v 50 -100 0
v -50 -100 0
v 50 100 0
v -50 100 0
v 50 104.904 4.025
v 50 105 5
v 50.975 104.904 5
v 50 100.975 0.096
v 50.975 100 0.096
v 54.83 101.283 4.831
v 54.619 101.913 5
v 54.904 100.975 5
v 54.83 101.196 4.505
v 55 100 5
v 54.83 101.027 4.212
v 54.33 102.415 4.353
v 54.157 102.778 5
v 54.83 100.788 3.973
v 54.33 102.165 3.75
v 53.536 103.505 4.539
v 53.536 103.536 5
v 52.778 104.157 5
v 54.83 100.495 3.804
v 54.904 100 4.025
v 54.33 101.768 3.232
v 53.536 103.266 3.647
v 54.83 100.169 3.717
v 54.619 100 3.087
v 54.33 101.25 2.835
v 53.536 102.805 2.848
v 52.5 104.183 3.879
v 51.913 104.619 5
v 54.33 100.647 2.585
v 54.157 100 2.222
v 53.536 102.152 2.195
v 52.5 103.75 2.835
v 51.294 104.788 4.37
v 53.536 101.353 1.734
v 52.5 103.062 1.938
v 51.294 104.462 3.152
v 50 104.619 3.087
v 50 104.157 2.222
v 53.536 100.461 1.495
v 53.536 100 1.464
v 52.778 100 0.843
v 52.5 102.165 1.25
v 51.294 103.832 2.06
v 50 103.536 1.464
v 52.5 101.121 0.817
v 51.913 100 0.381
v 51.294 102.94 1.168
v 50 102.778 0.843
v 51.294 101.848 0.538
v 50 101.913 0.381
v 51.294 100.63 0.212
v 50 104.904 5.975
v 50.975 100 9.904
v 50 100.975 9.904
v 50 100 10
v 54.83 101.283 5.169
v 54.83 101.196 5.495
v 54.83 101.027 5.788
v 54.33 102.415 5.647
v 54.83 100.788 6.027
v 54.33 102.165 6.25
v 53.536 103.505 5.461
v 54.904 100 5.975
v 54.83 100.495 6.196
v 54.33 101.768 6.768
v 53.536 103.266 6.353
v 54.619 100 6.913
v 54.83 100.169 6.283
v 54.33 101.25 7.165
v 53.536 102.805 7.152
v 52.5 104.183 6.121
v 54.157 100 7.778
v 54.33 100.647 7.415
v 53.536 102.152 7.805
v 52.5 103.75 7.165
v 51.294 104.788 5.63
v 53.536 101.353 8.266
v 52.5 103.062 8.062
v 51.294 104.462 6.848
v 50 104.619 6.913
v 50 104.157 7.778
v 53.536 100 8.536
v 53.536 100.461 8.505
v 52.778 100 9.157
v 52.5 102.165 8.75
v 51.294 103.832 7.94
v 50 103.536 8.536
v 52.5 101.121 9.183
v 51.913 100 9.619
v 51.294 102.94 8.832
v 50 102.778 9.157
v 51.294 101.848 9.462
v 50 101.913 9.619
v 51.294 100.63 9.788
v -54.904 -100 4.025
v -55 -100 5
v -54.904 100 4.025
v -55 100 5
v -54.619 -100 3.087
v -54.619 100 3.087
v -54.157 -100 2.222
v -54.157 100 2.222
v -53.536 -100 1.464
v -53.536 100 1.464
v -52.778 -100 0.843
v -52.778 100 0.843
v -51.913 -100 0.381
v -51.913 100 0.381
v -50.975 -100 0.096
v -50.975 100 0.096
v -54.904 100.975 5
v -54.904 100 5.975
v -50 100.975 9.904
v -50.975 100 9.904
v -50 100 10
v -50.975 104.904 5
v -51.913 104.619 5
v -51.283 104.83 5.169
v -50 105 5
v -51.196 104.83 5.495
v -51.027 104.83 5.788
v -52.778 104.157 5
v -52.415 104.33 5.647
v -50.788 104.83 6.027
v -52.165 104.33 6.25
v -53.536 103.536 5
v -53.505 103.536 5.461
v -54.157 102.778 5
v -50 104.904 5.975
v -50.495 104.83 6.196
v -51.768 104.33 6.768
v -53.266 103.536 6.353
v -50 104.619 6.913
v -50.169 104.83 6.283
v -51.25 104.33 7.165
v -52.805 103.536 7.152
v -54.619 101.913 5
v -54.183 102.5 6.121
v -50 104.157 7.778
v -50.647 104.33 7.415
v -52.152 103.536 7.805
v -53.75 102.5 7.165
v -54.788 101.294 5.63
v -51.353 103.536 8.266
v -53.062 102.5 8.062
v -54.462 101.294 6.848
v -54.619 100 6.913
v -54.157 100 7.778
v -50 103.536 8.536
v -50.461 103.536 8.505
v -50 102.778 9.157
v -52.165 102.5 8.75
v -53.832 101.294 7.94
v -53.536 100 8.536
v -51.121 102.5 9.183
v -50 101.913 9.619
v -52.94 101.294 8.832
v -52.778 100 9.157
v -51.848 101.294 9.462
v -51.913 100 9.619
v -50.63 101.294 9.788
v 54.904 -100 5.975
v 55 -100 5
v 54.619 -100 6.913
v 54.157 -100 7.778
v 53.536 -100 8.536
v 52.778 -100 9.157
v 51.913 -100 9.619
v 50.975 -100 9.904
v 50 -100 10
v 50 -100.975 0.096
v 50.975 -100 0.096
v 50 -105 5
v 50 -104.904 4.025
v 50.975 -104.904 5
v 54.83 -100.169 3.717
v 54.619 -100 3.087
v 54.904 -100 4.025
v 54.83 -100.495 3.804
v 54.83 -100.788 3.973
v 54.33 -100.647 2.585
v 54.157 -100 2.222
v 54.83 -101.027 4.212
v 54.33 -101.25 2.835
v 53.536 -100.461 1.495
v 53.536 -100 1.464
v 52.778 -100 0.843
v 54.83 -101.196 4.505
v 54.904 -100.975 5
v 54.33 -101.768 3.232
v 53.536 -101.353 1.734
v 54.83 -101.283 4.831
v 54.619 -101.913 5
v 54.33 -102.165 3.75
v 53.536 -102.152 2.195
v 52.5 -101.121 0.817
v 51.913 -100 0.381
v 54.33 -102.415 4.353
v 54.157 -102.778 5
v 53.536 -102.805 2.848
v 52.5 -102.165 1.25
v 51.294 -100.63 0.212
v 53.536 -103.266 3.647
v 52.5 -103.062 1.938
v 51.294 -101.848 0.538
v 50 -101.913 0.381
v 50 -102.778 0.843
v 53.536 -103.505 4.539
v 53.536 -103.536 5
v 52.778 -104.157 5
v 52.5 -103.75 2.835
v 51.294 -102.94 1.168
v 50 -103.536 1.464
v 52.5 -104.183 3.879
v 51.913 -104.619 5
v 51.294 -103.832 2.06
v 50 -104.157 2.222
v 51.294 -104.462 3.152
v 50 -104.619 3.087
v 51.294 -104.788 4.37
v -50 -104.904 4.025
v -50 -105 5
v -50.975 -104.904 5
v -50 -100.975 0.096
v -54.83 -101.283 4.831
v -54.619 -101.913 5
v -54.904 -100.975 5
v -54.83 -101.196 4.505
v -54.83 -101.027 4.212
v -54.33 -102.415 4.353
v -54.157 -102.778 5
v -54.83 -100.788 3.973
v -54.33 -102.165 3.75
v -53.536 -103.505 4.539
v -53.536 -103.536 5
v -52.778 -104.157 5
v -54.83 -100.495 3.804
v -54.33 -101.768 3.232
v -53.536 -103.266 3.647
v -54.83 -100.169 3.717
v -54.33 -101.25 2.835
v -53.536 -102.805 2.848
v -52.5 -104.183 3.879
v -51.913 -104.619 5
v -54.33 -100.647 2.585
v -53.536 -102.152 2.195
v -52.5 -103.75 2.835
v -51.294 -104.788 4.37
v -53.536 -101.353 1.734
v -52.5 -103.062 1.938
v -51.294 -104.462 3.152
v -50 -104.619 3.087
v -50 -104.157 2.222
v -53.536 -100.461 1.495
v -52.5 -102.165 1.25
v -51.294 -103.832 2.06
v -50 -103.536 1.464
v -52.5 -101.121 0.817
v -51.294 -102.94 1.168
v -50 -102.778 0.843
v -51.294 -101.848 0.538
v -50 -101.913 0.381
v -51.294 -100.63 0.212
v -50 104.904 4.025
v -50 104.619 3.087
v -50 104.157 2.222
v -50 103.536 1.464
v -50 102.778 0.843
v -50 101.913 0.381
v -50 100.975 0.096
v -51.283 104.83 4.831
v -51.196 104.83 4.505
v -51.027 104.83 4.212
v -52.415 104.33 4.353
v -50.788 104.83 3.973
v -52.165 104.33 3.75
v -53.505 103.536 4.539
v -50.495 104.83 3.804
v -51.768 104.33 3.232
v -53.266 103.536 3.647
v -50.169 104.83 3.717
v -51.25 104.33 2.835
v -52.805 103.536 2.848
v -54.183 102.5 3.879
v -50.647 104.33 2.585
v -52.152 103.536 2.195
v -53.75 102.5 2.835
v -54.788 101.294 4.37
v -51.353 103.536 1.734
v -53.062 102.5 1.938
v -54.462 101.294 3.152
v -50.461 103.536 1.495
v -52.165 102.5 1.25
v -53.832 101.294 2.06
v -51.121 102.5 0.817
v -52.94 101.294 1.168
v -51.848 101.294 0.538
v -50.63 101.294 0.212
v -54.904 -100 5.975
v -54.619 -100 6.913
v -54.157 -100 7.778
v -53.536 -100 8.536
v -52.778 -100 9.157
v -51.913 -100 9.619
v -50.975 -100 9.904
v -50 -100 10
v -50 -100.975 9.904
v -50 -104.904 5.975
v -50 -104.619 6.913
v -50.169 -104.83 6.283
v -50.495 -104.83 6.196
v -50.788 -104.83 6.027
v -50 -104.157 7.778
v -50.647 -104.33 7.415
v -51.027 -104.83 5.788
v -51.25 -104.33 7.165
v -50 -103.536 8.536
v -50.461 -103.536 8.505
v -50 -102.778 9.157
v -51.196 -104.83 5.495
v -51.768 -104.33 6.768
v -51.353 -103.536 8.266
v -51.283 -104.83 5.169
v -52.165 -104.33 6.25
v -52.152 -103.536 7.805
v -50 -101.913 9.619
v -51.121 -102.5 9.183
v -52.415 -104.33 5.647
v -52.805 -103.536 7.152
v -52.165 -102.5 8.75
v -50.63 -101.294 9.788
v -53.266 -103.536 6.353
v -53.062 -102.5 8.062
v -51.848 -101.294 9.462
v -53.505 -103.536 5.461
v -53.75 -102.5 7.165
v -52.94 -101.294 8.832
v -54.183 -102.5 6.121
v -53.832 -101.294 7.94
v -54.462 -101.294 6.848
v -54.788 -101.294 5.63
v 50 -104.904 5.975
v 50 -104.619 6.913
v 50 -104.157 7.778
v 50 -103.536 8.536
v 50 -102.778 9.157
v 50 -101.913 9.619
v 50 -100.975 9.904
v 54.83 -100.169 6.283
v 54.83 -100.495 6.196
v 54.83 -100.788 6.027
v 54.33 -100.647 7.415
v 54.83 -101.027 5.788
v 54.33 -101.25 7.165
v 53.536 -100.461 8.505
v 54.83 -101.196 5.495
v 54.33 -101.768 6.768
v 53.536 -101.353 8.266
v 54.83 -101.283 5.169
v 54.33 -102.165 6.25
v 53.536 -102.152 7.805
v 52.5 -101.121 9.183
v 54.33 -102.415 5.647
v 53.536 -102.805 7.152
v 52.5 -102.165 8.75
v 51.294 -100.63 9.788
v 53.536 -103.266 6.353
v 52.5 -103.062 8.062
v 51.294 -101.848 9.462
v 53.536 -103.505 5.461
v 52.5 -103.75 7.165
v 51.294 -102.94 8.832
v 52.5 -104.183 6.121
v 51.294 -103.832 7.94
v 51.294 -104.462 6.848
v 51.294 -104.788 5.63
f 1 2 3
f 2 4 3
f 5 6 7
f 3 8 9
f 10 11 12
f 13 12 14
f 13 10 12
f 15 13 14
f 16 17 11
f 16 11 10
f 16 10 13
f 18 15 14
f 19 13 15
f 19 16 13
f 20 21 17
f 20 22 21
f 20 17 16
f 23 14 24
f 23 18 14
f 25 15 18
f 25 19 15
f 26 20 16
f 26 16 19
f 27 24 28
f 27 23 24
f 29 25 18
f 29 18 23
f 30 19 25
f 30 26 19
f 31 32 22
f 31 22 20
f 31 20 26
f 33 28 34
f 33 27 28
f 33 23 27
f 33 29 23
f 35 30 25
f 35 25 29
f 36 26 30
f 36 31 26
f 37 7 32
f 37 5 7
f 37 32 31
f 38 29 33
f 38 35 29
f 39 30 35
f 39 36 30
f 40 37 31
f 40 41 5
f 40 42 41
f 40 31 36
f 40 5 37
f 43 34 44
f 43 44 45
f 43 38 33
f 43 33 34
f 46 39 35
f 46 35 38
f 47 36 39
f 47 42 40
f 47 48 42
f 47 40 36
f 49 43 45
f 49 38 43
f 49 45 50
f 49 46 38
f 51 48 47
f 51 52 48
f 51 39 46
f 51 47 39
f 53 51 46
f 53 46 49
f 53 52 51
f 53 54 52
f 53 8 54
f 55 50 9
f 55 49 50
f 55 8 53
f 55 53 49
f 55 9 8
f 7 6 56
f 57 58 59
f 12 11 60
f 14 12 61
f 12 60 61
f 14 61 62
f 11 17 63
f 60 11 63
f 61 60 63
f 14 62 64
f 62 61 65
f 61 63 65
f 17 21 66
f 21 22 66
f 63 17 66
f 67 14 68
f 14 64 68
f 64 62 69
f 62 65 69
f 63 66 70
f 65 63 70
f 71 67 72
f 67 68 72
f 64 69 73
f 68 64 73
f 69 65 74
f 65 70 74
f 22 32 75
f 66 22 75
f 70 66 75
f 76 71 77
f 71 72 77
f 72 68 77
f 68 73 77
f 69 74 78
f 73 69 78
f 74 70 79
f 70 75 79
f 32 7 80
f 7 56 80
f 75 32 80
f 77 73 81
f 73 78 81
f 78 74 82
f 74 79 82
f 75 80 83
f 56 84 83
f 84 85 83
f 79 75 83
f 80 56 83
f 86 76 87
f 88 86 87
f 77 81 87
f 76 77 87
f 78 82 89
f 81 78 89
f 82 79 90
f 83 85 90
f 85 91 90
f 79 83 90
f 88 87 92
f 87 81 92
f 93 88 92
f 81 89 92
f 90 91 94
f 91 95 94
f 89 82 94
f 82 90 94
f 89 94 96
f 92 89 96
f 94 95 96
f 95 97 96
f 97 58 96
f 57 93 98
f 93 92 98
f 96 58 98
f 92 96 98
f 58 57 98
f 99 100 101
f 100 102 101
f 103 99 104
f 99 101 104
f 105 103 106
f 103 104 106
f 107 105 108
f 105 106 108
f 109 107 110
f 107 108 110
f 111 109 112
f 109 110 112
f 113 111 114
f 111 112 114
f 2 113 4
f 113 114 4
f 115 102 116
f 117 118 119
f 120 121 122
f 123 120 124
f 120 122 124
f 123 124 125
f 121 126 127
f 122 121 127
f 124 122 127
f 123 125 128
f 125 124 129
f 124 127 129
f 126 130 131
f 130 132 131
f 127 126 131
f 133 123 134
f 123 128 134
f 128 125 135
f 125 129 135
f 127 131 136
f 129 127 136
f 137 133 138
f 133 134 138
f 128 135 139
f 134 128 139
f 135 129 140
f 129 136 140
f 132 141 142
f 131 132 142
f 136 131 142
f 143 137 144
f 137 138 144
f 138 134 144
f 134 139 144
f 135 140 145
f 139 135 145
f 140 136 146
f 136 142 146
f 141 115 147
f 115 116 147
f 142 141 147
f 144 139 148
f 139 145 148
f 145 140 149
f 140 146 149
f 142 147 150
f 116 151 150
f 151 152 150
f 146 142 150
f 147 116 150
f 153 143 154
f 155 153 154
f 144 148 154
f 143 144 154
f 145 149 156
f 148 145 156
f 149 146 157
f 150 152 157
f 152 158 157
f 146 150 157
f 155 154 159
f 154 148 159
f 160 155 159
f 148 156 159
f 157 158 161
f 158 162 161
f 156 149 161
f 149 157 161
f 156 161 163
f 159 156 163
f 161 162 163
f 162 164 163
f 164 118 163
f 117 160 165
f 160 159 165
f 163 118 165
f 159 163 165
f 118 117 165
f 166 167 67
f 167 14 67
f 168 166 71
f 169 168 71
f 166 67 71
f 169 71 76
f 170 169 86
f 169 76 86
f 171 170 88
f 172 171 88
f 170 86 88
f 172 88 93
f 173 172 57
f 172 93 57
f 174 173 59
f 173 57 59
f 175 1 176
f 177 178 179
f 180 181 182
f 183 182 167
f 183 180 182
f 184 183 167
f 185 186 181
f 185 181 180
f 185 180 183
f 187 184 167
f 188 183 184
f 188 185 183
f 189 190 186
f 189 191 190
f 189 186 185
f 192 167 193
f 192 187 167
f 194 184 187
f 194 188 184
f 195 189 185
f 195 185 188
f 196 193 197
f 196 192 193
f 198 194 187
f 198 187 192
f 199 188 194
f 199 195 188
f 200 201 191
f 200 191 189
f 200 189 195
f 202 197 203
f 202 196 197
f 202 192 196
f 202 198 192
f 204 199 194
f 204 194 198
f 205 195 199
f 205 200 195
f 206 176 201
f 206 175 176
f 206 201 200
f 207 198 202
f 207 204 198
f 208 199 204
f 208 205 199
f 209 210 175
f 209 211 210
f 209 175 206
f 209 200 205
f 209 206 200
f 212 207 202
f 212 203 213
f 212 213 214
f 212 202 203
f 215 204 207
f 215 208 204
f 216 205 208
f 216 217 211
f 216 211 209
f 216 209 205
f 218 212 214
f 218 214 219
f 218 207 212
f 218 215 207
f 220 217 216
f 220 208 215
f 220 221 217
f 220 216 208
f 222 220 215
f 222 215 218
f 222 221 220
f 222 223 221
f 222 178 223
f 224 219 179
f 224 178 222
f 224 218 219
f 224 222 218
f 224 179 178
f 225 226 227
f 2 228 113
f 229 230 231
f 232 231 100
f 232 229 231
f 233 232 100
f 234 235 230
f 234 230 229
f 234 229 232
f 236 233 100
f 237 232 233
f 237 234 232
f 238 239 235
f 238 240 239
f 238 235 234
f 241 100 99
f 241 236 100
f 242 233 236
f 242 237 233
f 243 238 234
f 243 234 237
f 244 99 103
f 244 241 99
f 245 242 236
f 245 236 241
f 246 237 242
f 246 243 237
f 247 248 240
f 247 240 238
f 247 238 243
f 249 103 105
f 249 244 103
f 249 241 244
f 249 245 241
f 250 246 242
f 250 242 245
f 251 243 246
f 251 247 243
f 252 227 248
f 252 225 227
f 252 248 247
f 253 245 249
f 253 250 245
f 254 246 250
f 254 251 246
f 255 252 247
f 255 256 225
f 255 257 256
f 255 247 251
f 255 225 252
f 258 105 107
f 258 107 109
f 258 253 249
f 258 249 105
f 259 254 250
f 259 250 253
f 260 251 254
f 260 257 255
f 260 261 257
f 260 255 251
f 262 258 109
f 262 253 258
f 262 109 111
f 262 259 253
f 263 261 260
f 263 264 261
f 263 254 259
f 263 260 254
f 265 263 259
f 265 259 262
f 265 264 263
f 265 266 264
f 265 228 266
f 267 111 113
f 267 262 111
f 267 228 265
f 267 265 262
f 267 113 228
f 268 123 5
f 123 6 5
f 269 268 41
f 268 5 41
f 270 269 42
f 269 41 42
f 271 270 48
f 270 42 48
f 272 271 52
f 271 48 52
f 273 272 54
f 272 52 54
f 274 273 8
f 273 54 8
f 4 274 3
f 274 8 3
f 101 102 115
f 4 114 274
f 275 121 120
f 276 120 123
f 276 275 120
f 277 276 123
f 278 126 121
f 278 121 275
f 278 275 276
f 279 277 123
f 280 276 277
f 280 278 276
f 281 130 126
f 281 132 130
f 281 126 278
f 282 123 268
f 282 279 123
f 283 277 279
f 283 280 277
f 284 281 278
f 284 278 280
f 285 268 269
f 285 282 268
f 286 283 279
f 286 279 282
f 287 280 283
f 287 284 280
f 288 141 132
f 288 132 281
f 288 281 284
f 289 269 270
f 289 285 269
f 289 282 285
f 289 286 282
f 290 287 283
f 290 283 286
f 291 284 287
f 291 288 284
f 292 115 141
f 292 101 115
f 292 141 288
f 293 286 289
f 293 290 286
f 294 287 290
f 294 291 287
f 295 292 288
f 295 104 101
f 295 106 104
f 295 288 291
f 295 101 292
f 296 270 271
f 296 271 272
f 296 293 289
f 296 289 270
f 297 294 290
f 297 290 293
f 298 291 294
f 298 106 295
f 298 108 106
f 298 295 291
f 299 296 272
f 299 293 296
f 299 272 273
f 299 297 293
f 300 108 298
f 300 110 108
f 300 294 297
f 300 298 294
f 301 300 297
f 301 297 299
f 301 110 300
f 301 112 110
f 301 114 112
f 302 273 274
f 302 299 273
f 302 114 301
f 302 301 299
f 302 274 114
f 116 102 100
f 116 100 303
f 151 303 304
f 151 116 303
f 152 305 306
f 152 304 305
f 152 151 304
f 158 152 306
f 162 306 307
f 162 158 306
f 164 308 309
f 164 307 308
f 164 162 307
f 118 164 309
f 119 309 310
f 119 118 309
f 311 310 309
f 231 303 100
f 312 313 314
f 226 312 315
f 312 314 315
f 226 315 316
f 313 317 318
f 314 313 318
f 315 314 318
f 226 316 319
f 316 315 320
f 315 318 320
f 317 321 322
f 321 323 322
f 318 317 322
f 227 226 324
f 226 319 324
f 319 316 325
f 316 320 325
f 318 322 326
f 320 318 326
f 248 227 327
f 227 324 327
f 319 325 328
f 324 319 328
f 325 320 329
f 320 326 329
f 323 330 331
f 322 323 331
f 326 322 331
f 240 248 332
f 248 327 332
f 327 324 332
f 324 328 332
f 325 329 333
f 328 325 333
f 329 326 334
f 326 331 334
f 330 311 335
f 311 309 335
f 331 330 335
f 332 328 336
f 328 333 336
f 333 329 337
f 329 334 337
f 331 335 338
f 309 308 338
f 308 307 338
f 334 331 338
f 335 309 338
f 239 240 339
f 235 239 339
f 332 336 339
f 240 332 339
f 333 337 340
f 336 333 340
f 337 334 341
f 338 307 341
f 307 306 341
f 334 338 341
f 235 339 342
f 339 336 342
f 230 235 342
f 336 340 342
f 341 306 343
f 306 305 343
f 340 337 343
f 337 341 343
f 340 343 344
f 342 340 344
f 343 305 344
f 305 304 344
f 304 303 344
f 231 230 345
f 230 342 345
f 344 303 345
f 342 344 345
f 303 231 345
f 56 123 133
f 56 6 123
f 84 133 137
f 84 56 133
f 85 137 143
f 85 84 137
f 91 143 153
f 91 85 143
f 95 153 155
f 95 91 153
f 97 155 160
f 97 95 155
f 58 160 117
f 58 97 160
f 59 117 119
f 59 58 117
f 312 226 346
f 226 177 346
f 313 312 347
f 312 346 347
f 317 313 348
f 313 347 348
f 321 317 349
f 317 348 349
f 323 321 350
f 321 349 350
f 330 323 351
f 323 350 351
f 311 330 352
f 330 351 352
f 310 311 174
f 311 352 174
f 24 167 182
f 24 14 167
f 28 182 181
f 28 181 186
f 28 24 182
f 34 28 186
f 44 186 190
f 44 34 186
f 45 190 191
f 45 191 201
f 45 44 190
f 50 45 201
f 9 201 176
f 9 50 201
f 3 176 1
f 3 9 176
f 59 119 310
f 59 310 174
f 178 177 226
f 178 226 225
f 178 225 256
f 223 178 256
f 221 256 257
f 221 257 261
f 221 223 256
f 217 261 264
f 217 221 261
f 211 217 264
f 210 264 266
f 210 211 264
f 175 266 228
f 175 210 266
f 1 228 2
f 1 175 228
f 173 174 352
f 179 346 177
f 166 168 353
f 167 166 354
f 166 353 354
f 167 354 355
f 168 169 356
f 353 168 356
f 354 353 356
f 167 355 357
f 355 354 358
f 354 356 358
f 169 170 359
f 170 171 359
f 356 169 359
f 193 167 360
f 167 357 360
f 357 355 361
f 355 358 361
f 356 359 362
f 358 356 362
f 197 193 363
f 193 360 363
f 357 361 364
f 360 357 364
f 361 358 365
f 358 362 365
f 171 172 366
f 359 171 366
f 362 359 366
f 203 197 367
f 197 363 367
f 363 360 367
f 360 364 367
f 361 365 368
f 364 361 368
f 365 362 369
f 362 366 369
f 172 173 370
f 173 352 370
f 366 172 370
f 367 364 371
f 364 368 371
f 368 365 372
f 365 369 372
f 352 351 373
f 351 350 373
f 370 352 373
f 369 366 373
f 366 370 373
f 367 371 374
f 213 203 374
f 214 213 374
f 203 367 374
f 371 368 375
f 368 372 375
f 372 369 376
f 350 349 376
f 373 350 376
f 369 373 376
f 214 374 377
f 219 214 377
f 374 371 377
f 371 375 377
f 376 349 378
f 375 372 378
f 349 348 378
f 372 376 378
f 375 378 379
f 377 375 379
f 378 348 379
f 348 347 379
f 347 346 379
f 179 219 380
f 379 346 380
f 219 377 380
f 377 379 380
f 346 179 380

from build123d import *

# Parameters (mm, degrees)
F0_W     = 110
F0_H     = 210
F1_DEPTH = 10
F2_R     = 4.99999


# Not quite as in the source:
# - a fillet or chamfer is up to 0.001 mm smaller than in the source, because OpenCascade refuses the exact size


with BuildPart() as f1:
    # F0 (on Top) → F1 (new body)
    with BuildSketch(Plane.XY):
        Rectangle(F0_W, F0_H)
    extrude(amount=F1_DEPTH)

    # F2 (radius 5 in the source; OpenCascade refuses exactly that, so slightly less here)
    f2_edges = [f1.edges().sort_by_distance(p)[0] for p in [
        (-55, 0, 10),
        (0, -105, 10),
        (0, -105, 0),
        (-55, -105, 5),
        (-55, 0, 0),
        (-55, 105, 5),
        (0, 105, 10),
        (0, 105, 0),
        (55, 105, 5),
        (55, 0, 10),
        (55, 0, 0),
        (55, -105, 5),
    ]]
    fillet(f2_edges, radius=F2_R)


solid = f1.part
